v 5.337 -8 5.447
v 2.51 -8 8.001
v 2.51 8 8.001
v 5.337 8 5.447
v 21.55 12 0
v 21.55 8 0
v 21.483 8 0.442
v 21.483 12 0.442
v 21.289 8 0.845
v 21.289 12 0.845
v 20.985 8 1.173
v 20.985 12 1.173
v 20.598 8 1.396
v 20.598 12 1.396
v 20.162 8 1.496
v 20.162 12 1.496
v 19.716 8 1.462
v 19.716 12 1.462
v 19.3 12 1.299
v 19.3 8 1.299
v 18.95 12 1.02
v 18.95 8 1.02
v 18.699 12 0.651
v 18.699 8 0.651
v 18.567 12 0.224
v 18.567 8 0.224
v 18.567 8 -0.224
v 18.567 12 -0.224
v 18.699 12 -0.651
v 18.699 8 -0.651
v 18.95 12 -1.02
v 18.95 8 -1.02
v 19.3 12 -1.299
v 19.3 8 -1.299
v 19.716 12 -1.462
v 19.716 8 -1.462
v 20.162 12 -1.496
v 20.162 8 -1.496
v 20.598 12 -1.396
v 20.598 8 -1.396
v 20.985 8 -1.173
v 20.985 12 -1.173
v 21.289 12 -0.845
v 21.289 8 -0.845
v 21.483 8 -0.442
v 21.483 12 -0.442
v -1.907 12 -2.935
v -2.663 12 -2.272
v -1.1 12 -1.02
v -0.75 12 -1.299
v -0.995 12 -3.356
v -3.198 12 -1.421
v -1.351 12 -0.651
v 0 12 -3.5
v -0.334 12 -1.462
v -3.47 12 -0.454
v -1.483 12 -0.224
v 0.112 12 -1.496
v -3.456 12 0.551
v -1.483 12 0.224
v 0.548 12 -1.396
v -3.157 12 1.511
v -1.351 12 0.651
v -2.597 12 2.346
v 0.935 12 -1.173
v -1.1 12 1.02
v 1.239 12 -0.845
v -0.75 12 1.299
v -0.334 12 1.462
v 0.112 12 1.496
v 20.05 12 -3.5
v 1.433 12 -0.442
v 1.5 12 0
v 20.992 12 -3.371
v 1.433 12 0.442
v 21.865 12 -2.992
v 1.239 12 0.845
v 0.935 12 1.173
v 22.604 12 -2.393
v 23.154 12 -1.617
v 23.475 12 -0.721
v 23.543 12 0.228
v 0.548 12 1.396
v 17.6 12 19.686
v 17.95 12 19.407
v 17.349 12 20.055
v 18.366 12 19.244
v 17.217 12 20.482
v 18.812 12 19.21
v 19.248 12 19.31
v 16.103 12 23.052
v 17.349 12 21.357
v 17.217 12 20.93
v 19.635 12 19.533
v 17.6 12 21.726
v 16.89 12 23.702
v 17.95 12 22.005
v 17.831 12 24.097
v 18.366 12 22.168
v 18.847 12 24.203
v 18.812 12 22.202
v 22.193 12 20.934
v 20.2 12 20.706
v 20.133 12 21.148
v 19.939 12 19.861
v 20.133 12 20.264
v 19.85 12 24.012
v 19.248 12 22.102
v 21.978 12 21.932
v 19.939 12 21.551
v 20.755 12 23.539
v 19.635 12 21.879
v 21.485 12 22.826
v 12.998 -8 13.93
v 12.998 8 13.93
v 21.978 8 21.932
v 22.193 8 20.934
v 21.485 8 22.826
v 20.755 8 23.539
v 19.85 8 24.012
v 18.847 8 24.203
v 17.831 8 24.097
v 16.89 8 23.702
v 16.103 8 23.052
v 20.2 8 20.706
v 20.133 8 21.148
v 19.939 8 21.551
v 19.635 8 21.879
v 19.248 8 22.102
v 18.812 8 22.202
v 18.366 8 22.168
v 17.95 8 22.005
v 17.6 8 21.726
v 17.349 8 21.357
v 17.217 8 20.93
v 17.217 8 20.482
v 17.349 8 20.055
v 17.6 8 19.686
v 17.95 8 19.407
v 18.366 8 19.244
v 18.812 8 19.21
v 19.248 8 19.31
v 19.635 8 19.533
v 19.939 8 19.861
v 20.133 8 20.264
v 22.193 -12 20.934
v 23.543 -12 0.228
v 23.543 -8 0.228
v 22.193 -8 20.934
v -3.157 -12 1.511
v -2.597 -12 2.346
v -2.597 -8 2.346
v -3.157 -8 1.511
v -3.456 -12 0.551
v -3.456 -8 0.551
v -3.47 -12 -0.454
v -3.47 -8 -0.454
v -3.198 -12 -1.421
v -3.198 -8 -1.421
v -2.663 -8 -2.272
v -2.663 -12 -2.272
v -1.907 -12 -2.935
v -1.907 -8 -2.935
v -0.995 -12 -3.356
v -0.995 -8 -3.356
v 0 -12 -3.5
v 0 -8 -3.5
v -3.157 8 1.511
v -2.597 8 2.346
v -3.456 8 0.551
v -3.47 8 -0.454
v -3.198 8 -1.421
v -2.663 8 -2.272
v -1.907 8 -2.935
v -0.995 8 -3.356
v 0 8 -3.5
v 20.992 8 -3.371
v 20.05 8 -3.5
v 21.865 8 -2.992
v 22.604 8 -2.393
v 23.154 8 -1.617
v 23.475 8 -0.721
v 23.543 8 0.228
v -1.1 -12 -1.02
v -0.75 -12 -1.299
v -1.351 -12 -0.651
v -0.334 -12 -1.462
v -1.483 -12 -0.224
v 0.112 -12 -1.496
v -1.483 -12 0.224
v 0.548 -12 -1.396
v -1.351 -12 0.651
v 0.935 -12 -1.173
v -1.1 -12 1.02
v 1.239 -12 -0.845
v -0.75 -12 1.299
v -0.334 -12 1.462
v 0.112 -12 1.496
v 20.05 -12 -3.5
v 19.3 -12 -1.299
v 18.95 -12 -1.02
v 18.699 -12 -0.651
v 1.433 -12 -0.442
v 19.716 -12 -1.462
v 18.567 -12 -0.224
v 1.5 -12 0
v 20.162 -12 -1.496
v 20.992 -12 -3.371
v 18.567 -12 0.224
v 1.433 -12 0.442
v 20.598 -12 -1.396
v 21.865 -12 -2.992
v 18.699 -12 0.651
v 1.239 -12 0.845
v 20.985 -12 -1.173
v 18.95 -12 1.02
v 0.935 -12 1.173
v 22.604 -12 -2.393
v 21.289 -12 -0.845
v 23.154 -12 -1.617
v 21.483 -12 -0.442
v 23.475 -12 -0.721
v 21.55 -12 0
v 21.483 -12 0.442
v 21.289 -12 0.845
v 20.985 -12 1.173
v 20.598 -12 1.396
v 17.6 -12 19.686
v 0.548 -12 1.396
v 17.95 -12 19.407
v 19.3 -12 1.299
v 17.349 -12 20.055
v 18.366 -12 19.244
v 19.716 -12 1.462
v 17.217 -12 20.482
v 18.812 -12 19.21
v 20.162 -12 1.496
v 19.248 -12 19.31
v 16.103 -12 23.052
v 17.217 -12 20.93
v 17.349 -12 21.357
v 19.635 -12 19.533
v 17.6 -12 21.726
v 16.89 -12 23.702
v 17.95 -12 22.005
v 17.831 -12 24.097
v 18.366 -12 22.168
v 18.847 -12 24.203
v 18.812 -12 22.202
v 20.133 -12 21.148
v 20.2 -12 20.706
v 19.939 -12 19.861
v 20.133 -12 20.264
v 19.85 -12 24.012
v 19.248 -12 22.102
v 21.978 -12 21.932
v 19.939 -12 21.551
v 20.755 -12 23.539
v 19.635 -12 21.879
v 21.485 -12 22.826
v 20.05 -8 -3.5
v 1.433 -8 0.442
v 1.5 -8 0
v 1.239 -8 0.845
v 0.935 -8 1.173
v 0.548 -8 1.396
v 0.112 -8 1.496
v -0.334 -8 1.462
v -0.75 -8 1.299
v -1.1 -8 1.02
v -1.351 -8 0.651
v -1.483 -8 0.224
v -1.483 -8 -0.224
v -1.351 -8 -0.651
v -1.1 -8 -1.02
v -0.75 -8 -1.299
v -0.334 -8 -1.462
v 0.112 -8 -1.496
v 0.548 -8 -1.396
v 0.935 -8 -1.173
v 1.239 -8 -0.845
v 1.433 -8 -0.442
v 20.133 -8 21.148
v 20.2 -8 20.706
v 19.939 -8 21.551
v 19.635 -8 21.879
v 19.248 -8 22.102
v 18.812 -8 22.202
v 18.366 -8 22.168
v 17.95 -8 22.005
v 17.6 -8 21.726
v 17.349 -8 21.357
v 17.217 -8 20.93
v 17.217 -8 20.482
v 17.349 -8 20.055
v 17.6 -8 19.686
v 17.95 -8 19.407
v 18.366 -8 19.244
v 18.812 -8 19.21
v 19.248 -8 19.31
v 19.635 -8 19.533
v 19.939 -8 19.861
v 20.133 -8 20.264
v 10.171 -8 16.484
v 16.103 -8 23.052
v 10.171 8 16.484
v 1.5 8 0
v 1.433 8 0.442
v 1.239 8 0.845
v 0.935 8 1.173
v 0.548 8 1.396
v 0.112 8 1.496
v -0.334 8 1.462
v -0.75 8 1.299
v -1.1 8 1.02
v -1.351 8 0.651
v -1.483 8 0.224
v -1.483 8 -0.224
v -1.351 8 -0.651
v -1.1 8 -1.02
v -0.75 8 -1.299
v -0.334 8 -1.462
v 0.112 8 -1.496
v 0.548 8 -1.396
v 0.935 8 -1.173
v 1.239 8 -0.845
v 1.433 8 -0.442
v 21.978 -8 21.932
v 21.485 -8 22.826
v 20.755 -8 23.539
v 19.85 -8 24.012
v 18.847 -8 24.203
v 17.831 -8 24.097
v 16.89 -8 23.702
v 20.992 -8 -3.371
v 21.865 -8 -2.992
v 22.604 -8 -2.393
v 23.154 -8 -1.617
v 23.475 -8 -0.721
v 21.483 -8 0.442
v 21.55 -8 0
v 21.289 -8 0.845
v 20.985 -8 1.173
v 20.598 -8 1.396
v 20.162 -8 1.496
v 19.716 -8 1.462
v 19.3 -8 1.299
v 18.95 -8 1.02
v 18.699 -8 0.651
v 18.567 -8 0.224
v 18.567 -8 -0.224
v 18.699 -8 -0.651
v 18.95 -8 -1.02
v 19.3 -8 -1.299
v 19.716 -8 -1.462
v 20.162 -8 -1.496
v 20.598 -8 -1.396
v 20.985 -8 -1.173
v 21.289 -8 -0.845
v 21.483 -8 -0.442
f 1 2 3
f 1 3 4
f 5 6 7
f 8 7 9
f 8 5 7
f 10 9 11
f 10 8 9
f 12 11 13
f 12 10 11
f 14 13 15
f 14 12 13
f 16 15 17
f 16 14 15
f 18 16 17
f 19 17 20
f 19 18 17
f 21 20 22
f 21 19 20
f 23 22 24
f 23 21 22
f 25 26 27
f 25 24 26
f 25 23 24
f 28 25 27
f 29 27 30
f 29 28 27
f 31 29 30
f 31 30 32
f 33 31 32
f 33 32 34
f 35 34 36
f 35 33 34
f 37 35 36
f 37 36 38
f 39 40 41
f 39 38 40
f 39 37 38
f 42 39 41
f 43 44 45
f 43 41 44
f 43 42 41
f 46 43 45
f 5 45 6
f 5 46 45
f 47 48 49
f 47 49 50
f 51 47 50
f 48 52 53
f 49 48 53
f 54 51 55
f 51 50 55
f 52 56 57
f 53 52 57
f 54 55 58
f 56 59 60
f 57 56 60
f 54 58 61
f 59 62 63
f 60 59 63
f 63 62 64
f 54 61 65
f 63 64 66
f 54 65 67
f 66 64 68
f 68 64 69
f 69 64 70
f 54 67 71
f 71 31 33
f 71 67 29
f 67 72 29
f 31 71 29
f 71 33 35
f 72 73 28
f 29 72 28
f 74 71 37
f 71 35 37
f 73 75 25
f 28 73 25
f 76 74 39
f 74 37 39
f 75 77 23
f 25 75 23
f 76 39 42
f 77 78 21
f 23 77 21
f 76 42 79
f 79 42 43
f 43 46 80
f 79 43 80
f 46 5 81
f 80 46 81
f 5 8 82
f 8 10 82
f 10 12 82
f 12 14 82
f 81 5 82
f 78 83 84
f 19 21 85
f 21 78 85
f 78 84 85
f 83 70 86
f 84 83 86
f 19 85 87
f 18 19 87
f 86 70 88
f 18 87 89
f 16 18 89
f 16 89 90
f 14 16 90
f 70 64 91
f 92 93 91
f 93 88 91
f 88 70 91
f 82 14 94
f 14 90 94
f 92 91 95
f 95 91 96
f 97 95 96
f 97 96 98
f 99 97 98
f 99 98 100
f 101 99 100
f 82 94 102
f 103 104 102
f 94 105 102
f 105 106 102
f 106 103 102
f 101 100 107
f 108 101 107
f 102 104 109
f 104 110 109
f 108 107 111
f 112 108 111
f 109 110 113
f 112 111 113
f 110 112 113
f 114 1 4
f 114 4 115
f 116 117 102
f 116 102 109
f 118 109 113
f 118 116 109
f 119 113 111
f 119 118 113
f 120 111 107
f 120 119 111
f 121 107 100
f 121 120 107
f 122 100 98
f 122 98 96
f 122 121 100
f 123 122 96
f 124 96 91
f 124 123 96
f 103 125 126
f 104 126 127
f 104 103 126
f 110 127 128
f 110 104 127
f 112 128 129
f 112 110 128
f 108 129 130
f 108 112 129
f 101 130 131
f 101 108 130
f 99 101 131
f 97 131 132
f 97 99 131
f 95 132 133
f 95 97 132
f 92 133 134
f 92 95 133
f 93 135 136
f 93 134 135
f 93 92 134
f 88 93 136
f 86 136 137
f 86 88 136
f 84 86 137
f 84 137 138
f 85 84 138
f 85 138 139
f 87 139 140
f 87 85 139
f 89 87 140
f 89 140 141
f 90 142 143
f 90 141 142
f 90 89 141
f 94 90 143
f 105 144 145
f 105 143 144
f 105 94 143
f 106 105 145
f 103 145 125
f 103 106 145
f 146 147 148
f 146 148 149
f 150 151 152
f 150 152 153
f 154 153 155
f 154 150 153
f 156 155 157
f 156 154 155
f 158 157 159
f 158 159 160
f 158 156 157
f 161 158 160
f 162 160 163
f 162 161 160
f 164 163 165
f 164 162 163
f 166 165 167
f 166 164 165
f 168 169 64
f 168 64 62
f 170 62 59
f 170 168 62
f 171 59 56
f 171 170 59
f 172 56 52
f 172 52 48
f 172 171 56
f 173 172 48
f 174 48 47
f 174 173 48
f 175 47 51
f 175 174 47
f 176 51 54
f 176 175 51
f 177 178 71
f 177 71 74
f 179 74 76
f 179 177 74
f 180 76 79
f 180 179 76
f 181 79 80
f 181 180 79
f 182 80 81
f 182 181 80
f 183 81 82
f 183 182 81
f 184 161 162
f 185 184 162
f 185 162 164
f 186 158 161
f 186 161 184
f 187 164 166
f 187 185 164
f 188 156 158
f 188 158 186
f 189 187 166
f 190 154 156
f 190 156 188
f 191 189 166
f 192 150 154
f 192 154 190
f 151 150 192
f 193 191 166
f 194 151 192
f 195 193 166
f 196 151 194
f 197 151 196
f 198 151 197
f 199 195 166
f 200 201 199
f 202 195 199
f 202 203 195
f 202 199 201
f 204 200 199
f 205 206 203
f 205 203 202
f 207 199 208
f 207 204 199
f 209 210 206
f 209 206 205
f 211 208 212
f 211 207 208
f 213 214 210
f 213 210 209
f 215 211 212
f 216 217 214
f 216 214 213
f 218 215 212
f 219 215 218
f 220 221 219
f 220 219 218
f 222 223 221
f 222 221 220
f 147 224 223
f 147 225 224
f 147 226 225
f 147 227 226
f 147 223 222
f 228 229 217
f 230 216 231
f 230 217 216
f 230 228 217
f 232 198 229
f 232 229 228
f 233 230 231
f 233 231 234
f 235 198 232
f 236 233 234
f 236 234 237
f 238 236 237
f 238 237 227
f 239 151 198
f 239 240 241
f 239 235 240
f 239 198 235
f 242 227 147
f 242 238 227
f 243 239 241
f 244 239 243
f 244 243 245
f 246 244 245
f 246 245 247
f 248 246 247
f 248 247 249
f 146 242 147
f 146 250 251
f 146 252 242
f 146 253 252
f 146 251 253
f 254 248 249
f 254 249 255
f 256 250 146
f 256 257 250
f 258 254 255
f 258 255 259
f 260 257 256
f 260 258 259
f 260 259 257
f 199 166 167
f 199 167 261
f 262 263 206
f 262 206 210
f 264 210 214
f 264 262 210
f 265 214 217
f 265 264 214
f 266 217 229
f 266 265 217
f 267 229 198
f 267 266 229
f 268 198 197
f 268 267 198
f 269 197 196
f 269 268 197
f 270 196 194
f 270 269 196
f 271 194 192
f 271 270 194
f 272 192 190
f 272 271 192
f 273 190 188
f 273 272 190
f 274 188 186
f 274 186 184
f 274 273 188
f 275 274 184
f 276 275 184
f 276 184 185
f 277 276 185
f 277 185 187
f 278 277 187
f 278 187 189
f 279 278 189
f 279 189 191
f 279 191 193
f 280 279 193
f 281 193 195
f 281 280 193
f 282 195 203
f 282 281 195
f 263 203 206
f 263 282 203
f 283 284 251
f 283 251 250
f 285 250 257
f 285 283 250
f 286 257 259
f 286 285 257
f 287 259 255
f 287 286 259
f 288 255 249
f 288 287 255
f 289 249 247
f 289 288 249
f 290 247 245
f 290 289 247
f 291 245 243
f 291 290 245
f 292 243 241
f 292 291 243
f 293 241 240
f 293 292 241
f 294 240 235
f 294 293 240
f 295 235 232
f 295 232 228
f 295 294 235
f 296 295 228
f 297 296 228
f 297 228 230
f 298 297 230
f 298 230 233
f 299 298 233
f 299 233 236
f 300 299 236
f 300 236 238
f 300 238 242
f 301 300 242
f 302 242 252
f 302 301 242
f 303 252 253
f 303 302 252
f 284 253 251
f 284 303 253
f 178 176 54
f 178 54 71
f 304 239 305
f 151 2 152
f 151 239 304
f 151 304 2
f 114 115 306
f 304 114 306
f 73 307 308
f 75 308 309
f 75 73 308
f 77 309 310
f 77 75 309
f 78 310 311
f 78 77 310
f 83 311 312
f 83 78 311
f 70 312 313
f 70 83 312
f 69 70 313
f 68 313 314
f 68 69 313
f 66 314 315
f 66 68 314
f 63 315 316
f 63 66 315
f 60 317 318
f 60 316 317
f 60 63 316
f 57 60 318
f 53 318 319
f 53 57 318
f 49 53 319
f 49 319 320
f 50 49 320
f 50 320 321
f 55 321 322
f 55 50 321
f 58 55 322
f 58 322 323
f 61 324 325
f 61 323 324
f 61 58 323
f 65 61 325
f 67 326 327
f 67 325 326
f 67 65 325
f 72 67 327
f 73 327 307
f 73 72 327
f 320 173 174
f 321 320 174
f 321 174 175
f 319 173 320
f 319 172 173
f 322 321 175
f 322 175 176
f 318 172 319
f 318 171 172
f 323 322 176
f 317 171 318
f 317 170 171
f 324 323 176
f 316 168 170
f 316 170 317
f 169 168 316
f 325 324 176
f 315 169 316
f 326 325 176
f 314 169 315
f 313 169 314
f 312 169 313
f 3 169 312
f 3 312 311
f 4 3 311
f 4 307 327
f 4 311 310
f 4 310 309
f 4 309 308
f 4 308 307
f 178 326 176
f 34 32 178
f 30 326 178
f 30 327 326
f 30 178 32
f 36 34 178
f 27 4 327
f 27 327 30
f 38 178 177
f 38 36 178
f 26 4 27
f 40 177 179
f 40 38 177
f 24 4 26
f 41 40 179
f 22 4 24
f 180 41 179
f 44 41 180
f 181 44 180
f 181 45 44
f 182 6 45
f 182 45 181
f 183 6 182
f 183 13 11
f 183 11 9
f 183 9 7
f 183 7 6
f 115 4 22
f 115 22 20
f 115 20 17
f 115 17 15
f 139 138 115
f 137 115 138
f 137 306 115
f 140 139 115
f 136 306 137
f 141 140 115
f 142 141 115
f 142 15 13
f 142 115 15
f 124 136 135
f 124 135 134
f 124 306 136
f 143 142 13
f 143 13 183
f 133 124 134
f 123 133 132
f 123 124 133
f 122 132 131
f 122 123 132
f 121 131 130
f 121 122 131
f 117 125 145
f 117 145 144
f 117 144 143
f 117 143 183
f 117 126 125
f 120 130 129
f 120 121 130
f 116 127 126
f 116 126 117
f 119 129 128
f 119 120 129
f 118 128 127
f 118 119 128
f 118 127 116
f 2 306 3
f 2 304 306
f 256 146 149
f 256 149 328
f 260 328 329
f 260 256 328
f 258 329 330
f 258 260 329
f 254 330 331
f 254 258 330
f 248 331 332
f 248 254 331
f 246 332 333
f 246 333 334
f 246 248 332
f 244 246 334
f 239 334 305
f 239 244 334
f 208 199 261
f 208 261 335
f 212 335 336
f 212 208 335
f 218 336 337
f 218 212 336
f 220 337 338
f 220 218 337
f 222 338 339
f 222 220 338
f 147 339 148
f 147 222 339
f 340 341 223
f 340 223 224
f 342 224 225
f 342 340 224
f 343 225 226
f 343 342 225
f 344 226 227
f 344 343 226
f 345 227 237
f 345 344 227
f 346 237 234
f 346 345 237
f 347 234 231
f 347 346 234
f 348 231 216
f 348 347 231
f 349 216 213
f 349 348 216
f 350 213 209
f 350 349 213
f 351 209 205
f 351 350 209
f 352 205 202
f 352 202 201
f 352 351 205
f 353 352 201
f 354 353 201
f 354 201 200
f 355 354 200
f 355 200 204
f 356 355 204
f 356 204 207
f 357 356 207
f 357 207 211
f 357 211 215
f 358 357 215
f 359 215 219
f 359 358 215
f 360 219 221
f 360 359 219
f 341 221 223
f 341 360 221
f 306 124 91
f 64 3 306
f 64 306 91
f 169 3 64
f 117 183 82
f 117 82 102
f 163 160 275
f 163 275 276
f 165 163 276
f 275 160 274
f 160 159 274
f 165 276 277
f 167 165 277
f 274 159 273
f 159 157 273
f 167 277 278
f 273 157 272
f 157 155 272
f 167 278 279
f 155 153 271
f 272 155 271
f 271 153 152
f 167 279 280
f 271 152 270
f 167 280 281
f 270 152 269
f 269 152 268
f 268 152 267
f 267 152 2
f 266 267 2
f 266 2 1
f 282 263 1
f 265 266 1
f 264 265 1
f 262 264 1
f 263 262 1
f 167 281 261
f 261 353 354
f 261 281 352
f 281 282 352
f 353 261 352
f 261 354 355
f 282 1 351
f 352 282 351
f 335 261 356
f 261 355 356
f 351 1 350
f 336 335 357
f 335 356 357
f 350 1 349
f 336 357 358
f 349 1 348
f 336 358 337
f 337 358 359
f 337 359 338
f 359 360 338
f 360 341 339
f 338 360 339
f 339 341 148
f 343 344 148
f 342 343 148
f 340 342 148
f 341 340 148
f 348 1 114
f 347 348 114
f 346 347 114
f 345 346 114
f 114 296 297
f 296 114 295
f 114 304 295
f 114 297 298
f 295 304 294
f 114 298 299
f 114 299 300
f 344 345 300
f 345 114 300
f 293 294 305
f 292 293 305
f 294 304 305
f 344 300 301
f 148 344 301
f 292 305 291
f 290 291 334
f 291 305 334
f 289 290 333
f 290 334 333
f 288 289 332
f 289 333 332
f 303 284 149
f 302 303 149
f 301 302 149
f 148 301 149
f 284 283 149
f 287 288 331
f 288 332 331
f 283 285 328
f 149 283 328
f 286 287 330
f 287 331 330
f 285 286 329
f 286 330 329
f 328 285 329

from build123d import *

# Parameters (mm, degrees)
F0_R     = 1.5
F1_DEPTH = 12
F4_DEPTH = 8
F5_DEPTH = 8


with BuildPart() as f1:
    # F0 (on Front) → F1 (new body, symmetric)
    with BuildSketch(Plane.XZ):
        with BuildLine():
            Line((16.1025038779, 23.0518503566), (-2.5974961221, 2.3458503566))
            ThreePointArc((-2.5974961221, 2.3458503566), (-3.1984743432, -1.4211832661), (0, -3.5))
            Line((0, -3.5), (20.05, -3.5))
            ThreePointArc((20.05, -3.5), (22.6041132903, -2.3930117635), (23.5425846566, 0.2277112569))
            Line((23.5425846566, 0.2277112569), (22.1925846566, 20.9337112569))
            ThreePointArc((22.1925846566, 20.9337112569), (19.8497496173, 24.0117640293), (16.1025038779, 23.0518503566))
        make_face()
        Circle(F0_R, mode=Mode.SUBTRACT)
        with Locations((20.05, 0)):
            Circle(F0_R, mode=Mode.SUBTRACT)
        with Locations((18.7, 20.706)):
            Circle(F0_R, mode=Mode.SUBTRACT)
    extrude(amount=F1_DEPTH, both=True)

    # F3 (on Front) → F4 (cut, symmetric)
    with BuildSketch(Plane.XZ):
        with BuildLine():
            ThreePointArc((-2.5974961221, 2.3458503566), (-3.1984743432, -1.4211832661), (0, -3.5))
            Line((0, -3.5), (20.05, -3.5))
            ThreePointArc((20.05, -3.5), (22.6041132903, -2.3930117635), (23.5425846566, 0.2277112569))
            Line((23.5425846566, 0.2277112569), (22.1925846566, 20.9337112569))
            ThreePointArc((22.1925846566, 20.9337112569), (19.8497496173, 24.0117640293), (16.1025038779, 23.0518503566))
            Line((16.1025038779, 23.0518503566), (-2.5974961221, 2.3458503566))
        make_face()
    extrude(amount=F4_DEPTH, both=True, mode=Mode.SUBTRACT)

    # F2 (on Front) → F5 (join, symmetric)
    with BuildSketch(Plane.XZ):
        Polygon((10.1706322474, 16.4836506784), (2.5097552257, 8.0009704853), (5.33731529, 5.4473448114), (12.9981923117, 13.9300250045), align=None)
    extrude(amount=F5_DEPTH, both=True)


solid = f1.part
